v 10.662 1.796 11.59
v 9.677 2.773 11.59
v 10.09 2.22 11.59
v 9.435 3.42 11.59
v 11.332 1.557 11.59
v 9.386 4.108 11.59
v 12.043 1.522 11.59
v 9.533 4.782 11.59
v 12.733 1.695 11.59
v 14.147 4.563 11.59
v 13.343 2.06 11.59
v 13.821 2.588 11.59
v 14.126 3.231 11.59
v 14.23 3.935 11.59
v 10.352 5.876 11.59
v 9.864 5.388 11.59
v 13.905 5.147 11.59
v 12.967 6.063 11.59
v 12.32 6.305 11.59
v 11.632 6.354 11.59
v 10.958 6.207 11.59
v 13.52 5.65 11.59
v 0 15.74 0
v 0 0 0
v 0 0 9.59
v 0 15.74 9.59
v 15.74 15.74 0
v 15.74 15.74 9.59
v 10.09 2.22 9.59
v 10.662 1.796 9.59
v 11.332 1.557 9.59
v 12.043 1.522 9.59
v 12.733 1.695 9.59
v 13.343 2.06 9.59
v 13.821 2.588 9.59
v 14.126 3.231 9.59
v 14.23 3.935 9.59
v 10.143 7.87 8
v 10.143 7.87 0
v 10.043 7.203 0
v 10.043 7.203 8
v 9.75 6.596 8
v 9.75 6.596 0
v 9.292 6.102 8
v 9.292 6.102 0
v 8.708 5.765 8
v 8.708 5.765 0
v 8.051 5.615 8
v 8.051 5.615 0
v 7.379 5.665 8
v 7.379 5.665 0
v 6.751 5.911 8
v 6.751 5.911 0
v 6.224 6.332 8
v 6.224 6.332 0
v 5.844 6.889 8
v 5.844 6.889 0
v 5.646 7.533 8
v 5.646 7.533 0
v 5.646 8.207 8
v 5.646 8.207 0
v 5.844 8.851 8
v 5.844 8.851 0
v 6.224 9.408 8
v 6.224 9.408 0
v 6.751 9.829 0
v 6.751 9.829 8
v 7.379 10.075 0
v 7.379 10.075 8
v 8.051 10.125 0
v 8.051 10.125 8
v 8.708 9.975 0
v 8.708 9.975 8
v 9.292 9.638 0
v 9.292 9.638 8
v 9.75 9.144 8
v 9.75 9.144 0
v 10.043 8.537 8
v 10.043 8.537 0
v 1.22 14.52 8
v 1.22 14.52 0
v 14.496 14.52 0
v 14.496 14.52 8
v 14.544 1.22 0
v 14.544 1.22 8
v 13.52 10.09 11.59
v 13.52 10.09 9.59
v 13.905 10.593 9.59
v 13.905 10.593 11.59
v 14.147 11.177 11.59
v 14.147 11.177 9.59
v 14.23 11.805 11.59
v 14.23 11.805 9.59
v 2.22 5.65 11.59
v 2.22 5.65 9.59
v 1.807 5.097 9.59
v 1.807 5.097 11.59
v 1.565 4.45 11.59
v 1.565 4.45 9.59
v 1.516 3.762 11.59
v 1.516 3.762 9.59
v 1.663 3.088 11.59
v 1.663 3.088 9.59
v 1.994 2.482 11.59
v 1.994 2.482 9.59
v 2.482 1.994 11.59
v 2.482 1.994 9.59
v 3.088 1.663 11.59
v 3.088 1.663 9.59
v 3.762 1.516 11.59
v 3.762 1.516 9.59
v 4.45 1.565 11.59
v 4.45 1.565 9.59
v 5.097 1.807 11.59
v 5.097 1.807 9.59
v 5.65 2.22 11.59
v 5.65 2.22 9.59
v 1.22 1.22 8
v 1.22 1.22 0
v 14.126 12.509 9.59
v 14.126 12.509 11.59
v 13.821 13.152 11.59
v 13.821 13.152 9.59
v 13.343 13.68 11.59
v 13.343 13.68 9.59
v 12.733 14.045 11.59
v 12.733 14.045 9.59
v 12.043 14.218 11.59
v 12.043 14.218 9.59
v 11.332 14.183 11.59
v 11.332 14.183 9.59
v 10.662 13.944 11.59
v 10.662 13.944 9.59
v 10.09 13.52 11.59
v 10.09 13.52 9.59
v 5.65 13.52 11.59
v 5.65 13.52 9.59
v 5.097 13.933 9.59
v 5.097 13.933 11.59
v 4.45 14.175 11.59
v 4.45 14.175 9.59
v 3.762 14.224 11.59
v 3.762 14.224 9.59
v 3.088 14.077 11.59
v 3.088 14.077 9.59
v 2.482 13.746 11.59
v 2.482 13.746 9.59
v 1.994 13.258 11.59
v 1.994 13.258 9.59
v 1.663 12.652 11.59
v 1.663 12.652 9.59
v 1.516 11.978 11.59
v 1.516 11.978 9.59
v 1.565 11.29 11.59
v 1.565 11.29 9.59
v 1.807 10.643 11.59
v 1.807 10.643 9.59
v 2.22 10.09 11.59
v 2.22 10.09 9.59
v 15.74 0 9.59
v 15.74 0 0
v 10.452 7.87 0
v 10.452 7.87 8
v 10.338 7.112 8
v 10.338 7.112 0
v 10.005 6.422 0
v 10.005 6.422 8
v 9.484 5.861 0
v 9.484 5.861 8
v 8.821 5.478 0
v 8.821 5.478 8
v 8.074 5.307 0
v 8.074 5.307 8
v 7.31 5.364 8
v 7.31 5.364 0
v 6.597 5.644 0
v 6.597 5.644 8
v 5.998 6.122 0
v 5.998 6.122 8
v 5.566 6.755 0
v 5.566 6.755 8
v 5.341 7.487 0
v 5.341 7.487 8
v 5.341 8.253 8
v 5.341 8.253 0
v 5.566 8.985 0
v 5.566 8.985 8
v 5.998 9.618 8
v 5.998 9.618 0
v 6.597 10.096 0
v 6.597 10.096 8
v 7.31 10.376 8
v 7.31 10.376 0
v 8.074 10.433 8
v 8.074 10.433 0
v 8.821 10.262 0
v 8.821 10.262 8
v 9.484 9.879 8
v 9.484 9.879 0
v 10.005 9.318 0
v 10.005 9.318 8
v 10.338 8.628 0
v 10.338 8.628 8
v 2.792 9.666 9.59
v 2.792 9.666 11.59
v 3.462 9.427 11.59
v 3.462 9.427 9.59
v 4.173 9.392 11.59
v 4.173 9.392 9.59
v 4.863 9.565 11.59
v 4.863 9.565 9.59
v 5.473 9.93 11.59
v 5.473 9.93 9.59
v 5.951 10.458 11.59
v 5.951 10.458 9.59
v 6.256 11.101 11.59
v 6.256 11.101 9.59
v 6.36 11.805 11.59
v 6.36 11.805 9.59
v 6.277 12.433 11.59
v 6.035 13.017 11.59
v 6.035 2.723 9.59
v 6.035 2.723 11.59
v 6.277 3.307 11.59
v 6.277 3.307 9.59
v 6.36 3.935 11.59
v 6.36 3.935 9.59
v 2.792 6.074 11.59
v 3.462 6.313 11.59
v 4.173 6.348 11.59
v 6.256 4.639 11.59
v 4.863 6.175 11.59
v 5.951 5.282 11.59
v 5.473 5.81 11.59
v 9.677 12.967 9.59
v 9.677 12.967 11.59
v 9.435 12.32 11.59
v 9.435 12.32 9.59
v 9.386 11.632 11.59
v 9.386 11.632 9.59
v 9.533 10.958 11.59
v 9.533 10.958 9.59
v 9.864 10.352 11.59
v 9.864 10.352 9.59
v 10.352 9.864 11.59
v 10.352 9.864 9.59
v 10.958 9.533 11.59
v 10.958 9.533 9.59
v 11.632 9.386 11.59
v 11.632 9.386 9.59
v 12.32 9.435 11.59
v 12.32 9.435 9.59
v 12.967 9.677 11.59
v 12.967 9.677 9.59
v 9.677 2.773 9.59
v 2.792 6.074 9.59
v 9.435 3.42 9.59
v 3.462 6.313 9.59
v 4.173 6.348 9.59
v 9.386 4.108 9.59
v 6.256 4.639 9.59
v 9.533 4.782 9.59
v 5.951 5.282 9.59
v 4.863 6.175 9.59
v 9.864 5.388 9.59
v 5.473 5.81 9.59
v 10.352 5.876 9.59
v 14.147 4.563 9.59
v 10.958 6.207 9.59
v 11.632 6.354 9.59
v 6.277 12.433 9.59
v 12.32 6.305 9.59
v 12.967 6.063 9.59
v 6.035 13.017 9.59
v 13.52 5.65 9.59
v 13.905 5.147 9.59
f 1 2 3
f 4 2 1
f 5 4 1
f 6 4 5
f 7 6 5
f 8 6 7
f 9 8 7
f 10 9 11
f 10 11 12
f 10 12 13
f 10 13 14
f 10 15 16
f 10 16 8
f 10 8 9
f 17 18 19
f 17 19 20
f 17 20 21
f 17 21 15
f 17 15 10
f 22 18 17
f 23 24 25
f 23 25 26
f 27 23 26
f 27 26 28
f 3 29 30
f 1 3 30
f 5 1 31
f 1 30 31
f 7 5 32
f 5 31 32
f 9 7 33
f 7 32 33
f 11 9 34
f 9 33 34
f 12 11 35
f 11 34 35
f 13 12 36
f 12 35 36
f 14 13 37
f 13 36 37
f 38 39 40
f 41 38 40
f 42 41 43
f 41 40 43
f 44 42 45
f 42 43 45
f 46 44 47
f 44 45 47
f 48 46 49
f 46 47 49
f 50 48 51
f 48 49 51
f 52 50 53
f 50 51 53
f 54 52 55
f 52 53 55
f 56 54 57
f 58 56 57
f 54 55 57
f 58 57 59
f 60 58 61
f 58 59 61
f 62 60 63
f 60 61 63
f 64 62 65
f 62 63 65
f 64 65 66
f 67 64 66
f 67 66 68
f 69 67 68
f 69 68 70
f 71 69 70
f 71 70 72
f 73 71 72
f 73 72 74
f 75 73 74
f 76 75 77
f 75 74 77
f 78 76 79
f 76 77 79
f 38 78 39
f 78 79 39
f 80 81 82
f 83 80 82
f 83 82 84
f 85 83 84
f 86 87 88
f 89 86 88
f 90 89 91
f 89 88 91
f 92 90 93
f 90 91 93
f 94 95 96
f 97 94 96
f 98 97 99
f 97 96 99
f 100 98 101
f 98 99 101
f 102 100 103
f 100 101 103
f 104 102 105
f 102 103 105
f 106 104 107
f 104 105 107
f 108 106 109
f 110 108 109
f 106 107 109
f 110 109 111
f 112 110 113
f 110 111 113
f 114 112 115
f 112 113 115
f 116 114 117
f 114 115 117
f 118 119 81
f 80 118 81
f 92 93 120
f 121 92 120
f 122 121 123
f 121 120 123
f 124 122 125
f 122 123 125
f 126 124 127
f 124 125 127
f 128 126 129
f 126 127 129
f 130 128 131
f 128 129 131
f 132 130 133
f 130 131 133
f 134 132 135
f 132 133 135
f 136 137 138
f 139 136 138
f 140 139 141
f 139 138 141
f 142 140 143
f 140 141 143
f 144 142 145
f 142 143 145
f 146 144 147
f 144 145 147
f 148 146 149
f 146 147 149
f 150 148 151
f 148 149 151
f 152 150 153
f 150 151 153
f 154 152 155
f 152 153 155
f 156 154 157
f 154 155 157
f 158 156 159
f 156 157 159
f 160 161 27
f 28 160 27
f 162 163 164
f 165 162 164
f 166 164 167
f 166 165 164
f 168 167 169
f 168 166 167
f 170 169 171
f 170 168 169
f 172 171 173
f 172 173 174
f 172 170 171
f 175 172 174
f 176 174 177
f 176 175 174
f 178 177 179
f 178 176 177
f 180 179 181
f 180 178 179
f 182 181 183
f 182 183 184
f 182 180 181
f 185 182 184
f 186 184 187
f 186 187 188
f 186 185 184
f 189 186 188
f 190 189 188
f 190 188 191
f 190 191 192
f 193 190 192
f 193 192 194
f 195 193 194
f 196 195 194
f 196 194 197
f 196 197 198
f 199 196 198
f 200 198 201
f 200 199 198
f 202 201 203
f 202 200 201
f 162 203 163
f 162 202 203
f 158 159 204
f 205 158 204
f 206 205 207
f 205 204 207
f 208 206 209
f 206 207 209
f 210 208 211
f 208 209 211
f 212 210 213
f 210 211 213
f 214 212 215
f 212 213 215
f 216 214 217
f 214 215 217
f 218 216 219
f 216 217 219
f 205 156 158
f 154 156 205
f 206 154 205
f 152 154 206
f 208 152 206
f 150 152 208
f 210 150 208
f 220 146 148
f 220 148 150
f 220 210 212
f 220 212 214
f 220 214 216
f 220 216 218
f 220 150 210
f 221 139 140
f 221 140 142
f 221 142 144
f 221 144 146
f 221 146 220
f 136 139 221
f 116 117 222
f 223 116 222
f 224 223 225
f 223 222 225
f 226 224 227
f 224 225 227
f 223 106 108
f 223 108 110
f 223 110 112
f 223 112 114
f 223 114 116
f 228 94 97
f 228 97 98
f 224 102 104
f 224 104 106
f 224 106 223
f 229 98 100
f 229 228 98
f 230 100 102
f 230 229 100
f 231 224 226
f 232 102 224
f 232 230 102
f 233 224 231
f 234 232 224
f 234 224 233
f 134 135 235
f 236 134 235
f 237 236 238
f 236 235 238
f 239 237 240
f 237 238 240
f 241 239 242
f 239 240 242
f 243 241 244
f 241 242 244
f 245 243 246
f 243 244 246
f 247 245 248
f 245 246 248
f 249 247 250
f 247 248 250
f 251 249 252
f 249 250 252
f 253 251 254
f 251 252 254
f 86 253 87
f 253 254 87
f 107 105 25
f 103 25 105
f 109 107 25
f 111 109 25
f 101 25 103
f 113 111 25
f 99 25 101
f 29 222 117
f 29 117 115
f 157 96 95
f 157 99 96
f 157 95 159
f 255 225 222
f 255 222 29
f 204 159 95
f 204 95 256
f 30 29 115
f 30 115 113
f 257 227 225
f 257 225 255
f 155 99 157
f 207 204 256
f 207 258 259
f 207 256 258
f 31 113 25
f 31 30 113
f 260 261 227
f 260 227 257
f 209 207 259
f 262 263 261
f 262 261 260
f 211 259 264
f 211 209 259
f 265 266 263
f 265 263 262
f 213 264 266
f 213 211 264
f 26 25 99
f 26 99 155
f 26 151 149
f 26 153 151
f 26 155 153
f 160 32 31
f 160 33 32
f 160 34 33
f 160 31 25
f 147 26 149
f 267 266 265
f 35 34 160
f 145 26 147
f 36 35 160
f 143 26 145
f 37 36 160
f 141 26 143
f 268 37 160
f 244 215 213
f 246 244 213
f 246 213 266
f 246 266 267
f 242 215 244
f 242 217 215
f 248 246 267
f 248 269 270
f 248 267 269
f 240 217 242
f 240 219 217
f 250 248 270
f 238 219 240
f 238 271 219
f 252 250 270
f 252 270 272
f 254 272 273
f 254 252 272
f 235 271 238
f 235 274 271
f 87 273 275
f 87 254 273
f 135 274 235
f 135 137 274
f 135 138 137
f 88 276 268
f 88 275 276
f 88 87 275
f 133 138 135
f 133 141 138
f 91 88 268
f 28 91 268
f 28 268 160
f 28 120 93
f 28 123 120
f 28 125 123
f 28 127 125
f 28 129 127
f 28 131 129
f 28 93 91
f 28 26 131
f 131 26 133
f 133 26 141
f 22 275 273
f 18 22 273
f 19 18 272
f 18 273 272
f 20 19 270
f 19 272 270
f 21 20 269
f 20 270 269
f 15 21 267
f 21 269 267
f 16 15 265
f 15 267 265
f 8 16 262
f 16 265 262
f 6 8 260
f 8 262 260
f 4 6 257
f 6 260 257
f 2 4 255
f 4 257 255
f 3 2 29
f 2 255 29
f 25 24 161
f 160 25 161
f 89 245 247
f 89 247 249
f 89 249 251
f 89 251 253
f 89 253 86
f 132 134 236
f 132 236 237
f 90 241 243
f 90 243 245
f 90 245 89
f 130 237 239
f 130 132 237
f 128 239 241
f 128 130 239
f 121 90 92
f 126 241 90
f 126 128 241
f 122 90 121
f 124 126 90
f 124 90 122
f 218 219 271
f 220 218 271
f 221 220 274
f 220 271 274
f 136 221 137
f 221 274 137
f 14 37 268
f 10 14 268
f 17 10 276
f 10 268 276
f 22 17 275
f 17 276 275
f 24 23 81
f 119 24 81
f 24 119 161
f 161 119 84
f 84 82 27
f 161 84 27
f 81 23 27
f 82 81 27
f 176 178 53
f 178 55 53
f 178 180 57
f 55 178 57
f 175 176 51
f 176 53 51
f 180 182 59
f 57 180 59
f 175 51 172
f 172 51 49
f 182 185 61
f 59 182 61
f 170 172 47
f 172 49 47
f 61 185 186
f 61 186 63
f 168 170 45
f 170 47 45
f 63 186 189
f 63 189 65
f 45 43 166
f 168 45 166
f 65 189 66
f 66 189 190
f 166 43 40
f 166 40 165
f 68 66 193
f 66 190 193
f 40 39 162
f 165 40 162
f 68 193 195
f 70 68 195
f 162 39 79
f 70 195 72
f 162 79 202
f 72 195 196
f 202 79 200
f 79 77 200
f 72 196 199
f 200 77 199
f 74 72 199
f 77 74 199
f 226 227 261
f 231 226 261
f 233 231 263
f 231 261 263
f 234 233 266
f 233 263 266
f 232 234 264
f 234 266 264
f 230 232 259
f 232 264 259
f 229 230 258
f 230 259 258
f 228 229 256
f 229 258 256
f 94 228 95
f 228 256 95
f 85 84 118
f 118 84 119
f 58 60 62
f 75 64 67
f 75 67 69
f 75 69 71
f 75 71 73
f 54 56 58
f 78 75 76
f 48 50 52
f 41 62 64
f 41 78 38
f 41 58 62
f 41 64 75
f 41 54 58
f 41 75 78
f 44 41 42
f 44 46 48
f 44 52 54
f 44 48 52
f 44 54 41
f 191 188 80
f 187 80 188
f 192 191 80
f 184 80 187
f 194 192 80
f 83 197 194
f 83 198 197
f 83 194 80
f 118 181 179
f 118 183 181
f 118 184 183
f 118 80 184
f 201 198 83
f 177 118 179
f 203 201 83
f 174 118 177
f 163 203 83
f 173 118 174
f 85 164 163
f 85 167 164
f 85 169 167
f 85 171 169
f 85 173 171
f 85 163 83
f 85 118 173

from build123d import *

# Parameters (mm, degrees)
F0_W     = 15.74
F0_H     = 15.74
F1_DEPTH = 9.59
F3_DEPTH = 2
F4_R     = 2.57
F5_DEPTH = 8
F4_R_2   = 2.2615660893
F6_DEPTH = 8


with BuildPart() as f1:
    # F0 (on Top) → F1 (new body)
    with BuildSketch(Plane.XY):
        with Locations((7.87, 7.87)):
            Rectangle(F0_W, F0_H)
    extrude(amount=F1_DEPTH)

    # F2 (on face) → F3 (join)
    with BuildSketch(Plane.XY.offset(9.59)):
        with BuildLine():
            ThreePointArc((6.36, 11.805), (6.1754078663, 12.7330073235), (5.6497339444, 13.5197339444))
            Line((5.6497339444, 13.5197339444), (2.2202660556, 10.0902660556))
            ThreePointArc((2.2202660556, 10.0902660556), (4.8630073235, 9.5645921337), (6.36, 11.805))
        make_face()
        with BuildLine():
            Line((2.2202660556, 10.0902660556), (5.6497339444, 13.5197339444))
            ThreePointArc((5.6497339444, 13.5197339444), (2.2202660556, 13.5197339444), (2.2202660556, 10.0902660556))
        make_face()
        with BuildLine():
            ThreePointArc((14.23, 11.805), (12.7330073235, 14.0454078663), (10.0902660556, 13.5197339444))
            Line((10.0902660556, 13.5197339444), (13.5197339444, 10.0902660556))
            ThreePointArc((13.5197339444, 10.0902660556), (14.0454078663, 10.8769926765), (14.23, 11.805))
        make_face()
        with BuildLine():
            Line((13.5197339444, 10.0902660556), (10.0902660556, 13.5197339444))
            ThreePointArc((10.0902660556, 13.5197339444), (10.0902660556, 10.0902660556), (13.5197339444, 10.0902660556))
        make_face()
        with BuildLine():
            Line((13.5197339444, 5.6497339444), (10.0902660556, 2.2202660556))
            ThreePointArc((10.0902660556, 2.2202660556), (12.7330073235, 1.6945921337), (14.23, 3.935))
            ThreePointArc((14.23, 3.935), (14.0454078663, 4.8630073235), (13.5197339444, 5.6497339444))
        make_face()
        with BuildLine():
            ThreePointArc((13.5197339444, 5.6497339444), (10.0902660556, 5.6497339444), (10.0902660556, 2.2202660556))
            Line((10.0902660556, 2.2202660556), (13.5197339444, 5.6497339444))
        make_face()
        with BuildLine():
            Line((2.2202660556, 5.6497339444), (5.6497339444, 2.2202660556))
            ThreePointArc((5.6497339444, 2.2202660556), (6.1754078663, 3.0069926765), (6.36, 3.935))
            ThreePointArc((6.36, 3.935), (4.8630073235, 6.1754078663), (2.2202660556, 5.6497339444))
        make_face()
        with BuildLine():
            ThreePointArc((2.2202660556, 5.6497339444), (2.2202660556, 2.2202660556), (5.6497339444, 2.2202660556))
            Line((5.6497339444, 2.2202660556), (2.2202660556, 5.6497339444))
        make_face()
    extrude(amount=F3_DEPTH)

    # F4 (on face) → F5 (cut)
    with BuildSketch(Plane(origin=(0, 0, 0), x_dir=(1, 0, 0), z_dir=(0, 0, -1))):
        Polygon((14.5437045489, -1.22), (1.22, -1.22), (1.22, -14.52), (14.4962799393, -14.52), align=None)
        with Locations((7.8818522745, -7.87)):
            Circle(F4_R, mode=Mode.SUBTRACT)
    extrude(amount=-F5_DEPTH, mode=Mode.SUBTRACT)

    # F4 (on face) → F6 (cut)
    with BuildSketch(Plane(origin=(0, 0, 0), x_dir=(1, 0, 0), z_dir=(0, 0, -1))):
        with Locations((7.8818522745, -7.87)):
            Circle(F4_R_2)
    extrude(amount=-F6_DEPTH, mode=Mode.SUBTRACT)


solid = f1.part
